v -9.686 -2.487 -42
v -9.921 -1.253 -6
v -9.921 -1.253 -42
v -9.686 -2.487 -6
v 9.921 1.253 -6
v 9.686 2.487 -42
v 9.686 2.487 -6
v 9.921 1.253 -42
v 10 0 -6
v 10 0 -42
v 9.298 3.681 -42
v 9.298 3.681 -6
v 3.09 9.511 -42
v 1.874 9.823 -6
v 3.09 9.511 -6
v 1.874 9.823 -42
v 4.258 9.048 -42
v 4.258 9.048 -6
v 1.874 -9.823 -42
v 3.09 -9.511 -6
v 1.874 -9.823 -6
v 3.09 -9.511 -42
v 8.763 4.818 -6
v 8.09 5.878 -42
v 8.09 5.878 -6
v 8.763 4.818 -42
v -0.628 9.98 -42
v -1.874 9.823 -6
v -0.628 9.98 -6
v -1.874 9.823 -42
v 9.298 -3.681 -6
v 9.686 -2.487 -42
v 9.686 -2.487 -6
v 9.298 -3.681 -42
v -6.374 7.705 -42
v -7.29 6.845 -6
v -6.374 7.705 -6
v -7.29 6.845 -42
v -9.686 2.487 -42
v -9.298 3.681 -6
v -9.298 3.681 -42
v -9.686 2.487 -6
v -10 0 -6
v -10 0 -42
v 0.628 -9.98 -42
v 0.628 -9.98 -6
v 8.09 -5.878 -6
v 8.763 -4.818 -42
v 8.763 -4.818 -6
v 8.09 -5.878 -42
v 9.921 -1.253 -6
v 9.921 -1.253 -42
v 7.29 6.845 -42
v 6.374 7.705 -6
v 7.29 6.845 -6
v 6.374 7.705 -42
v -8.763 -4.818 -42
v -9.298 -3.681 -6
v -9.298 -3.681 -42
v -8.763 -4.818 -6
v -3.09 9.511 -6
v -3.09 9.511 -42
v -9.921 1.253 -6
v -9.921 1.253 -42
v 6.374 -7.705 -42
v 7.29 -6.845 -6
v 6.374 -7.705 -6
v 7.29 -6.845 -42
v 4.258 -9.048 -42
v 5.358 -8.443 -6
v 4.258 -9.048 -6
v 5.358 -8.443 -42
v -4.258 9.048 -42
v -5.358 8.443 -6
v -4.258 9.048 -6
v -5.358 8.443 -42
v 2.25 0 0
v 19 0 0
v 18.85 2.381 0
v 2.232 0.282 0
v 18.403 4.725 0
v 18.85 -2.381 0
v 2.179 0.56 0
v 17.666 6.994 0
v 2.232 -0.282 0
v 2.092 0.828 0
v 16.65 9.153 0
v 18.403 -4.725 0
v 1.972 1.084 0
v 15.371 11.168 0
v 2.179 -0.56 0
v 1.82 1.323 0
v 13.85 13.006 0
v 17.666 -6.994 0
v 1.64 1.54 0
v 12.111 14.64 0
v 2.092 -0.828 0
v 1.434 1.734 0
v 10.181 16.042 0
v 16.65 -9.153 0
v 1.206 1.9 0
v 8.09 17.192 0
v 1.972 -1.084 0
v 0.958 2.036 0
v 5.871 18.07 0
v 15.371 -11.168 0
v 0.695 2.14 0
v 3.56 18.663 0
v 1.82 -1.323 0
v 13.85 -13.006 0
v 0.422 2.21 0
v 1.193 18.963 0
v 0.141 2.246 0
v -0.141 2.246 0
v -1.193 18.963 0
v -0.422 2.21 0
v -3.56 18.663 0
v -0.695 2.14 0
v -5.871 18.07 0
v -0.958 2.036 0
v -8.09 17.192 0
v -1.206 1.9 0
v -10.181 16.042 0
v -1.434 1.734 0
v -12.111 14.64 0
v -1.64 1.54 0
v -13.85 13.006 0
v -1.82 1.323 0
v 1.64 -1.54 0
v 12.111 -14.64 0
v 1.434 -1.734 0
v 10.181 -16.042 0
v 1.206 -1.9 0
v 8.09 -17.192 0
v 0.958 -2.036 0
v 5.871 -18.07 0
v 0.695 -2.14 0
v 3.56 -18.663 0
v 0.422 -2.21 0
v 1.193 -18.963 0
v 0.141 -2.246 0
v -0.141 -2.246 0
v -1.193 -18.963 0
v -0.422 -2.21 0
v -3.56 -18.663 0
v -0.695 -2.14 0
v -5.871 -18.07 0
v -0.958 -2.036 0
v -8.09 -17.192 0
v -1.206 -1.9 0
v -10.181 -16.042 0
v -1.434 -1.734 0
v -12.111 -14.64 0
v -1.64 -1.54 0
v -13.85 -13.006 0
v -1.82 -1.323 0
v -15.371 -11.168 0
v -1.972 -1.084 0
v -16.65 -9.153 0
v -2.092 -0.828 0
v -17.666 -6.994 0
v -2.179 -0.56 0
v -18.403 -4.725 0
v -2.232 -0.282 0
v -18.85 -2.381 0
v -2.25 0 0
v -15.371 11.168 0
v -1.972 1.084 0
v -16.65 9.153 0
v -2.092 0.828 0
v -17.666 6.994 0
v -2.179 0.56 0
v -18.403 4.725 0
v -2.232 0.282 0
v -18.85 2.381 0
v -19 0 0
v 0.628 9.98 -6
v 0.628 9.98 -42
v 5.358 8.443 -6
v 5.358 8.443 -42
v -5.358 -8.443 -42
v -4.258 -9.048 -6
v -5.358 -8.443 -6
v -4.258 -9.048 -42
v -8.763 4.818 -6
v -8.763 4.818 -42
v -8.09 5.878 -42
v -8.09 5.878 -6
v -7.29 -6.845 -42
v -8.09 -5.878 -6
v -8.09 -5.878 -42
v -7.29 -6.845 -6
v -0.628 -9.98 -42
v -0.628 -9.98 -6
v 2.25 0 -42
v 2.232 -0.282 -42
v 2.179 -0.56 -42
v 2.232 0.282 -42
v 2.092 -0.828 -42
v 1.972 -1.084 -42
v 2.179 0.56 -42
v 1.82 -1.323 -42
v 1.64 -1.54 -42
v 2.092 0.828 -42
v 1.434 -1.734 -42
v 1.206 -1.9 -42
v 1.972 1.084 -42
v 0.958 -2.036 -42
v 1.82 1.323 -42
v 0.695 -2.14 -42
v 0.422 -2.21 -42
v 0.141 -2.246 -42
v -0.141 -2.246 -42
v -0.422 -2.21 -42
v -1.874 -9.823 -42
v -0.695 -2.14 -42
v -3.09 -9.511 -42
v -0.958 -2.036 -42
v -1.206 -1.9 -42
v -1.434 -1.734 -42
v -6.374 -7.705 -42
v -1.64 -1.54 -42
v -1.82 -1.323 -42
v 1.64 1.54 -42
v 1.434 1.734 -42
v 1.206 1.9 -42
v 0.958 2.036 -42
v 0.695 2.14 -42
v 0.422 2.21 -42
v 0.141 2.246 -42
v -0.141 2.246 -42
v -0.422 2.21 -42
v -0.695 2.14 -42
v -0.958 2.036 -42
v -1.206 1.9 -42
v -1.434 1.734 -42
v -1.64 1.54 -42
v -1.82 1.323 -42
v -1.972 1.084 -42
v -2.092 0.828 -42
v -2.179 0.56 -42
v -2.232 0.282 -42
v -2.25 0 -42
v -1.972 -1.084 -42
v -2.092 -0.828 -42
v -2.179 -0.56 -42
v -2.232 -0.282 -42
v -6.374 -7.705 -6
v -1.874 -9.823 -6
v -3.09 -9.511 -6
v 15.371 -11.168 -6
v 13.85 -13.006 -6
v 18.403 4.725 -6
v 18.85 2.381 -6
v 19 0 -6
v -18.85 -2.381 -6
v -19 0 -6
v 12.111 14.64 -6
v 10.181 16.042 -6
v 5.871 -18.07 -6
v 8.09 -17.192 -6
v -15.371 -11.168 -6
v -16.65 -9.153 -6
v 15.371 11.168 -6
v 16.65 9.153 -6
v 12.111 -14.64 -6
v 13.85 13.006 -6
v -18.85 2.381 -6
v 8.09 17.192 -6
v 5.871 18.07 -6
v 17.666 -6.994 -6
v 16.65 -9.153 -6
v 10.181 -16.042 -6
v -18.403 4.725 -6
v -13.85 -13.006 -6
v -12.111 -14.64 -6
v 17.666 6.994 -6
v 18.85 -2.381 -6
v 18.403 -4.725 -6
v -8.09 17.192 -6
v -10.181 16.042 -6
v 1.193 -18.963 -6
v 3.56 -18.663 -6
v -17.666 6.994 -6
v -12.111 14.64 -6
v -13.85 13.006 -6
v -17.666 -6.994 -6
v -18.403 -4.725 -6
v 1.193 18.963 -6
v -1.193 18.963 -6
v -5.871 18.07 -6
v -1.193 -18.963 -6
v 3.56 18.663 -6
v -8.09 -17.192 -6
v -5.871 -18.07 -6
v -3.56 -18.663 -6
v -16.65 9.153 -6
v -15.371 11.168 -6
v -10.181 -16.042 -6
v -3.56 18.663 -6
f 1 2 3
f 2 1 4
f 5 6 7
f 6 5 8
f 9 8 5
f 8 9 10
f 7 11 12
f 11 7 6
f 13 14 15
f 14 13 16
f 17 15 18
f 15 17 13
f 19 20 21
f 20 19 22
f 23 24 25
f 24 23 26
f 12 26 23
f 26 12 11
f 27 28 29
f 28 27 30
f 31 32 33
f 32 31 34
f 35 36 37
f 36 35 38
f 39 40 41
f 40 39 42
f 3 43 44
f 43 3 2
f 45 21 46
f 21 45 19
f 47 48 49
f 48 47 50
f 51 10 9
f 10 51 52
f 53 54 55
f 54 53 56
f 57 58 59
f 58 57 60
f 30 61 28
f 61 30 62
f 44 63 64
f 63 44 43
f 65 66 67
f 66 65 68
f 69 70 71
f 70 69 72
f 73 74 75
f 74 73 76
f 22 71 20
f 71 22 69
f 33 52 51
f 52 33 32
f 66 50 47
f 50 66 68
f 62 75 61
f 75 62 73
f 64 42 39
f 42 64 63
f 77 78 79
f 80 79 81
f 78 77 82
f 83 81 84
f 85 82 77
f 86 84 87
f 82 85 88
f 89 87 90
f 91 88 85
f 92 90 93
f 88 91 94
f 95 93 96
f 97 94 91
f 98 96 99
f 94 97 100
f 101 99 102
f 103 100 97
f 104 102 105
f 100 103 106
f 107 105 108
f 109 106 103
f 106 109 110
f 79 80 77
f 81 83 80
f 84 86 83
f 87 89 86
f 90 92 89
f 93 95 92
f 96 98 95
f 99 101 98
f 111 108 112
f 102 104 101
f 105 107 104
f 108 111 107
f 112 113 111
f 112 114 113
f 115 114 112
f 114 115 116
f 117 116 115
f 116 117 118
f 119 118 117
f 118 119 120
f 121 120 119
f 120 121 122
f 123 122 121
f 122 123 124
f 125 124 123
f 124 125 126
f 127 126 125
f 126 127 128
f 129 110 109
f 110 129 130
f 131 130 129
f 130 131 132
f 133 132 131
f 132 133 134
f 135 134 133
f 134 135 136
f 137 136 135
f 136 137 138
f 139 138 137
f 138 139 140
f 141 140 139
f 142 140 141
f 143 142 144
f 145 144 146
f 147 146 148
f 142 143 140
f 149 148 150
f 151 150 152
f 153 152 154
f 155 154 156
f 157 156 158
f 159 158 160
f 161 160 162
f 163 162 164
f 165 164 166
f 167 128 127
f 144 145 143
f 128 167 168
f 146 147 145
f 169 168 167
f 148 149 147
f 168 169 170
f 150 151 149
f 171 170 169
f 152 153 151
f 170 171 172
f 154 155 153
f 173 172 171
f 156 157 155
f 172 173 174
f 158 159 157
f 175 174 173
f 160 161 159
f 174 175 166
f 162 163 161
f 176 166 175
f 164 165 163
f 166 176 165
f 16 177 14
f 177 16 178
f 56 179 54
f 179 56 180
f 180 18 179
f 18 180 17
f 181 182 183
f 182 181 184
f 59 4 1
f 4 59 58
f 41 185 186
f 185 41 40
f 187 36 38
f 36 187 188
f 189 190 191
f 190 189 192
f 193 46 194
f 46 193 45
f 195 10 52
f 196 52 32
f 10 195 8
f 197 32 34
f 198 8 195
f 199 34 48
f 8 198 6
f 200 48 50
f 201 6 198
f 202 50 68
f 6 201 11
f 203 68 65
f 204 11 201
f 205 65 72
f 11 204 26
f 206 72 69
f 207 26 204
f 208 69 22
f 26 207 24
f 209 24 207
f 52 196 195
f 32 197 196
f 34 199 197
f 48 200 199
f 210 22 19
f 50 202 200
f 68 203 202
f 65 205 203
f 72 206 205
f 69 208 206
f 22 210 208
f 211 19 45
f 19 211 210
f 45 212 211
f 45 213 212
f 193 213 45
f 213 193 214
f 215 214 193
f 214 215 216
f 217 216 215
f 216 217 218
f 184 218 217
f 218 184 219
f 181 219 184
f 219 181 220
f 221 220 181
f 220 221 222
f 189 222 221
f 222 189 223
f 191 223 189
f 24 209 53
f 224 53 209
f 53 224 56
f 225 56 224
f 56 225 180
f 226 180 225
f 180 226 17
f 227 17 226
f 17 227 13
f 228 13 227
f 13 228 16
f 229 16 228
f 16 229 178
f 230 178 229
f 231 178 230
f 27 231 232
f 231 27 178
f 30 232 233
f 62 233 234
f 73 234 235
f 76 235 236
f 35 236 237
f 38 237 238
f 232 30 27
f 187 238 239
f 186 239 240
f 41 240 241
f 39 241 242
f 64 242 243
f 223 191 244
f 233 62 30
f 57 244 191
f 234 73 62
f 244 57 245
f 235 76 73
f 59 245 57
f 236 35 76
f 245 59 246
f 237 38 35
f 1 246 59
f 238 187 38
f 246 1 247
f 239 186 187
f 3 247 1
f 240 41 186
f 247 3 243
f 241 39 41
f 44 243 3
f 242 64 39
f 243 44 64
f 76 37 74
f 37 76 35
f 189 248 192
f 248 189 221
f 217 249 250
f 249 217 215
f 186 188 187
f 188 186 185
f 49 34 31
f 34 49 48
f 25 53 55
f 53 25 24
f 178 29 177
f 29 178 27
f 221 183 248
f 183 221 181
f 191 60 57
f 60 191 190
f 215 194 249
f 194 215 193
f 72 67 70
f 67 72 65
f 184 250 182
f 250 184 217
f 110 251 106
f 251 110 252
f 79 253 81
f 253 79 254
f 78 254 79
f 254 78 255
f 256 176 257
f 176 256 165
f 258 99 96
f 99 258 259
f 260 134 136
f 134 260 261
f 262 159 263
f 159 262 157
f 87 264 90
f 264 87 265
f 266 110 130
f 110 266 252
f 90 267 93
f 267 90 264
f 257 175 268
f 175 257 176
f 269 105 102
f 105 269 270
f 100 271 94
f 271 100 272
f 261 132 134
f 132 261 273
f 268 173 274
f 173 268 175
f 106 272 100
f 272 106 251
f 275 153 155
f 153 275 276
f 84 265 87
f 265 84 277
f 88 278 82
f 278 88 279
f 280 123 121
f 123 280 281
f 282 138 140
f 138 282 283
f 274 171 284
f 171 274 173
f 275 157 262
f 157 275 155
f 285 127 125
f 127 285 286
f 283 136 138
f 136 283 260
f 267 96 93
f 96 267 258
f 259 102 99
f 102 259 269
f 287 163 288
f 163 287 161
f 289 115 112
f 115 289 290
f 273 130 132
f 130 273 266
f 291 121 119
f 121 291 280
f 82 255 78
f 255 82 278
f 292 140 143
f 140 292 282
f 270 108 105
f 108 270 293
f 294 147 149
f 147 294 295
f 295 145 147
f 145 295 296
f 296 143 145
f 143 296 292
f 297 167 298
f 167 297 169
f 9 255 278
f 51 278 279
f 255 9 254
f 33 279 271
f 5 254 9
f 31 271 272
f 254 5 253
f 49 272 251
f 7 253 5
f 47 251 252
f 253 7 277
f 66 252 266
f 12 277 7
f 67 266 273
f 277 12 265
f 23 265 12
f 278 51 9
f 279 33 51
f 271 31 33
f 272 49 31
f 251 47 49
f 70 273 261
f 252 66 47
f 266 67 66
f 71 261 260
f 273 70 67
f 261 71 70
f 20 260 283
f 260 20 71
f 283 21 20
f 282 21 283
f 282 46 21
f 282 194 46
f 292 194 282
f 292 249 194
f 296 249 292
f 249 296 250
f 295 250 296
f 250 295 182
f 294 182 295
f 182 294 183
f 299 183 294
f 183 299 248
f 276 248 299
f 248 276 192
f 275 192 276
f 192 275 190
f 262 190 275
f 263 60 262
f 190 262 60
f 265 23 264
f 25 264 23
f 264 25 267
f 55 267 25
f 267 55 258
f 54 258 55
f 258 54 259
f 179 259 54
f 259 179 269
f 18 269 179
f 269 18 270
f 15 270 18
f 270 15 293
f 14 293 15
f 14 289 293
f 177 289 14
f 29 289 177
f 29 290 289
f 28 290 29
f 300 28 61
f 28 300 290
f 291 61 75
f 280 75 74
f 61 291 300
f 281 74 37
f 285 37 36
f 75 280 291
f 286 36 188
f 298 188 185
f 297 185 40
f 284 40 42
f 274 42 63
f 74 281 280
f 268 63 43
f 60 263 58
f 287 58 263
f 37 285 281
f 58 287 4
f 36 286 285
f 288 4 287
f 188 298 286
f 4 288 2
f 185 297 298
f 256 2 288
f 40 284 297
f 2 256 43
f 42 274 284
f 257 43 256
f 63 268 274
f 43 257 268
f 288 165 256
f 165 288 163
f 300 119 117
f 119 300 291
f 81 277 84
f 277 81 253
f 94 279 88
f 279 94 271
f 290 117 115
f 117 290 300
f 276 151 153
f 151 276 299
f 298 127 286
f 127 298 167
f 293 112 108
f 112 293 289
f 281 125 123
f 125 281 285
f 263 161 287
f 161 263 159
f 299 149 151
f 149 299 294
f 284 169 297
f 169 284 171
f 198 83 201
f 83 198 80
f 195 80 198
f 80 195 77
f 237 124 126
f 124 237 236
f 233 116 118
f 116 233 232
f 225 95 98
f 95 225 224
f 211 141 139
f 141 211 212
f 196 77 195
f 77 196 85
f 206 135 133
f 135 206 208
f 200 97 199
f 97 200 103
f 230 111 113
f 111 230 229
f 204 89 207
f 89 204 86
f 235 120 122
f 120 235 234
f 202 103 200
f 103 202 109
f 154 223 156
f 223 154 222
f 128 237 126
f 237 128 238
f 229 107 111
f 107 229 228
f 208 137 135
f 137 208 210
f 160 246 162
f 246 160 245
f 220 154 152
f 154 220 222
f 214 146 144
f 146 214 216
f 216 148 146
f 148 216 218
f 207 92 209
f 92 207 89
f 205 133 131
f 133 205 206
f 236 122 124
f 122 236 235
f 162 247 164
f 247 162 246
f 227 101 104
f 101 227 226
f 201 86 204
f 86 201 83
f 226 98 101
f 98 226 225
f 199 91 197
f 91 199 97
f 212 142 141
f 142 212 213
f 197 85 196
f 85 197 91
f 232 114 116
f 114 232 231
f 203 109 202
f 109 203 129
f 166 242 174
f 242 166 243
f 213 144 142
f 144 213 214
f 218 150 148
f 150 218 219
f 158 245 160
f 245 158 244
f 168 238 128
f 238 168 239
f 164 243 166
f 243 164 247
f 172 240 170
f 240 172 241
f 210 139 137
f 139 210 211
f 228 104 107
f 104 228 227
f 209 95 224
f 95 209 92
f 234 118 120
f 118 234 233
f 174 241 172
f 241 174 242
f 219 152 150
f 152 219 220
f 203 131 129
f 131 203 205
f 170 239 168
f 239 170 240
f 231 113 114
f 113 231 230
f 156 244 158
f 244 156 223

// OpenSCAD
$fn = 50;


difference() {
	union() {
		translate(v = [0, 0, -42.0000000000]) {
			cylinder(h = 42, r = 10.0000000000);
		}
		translate(v = [0, 0, -6.0000000000]) {
			cylinder(h = 6, r = 19.0000000000);
		}
	}
	union() {
		#translate(v = [0, 0, -42]) {
			cylinder(h = 42, r = 2.2500000000);
		}
	}
}
